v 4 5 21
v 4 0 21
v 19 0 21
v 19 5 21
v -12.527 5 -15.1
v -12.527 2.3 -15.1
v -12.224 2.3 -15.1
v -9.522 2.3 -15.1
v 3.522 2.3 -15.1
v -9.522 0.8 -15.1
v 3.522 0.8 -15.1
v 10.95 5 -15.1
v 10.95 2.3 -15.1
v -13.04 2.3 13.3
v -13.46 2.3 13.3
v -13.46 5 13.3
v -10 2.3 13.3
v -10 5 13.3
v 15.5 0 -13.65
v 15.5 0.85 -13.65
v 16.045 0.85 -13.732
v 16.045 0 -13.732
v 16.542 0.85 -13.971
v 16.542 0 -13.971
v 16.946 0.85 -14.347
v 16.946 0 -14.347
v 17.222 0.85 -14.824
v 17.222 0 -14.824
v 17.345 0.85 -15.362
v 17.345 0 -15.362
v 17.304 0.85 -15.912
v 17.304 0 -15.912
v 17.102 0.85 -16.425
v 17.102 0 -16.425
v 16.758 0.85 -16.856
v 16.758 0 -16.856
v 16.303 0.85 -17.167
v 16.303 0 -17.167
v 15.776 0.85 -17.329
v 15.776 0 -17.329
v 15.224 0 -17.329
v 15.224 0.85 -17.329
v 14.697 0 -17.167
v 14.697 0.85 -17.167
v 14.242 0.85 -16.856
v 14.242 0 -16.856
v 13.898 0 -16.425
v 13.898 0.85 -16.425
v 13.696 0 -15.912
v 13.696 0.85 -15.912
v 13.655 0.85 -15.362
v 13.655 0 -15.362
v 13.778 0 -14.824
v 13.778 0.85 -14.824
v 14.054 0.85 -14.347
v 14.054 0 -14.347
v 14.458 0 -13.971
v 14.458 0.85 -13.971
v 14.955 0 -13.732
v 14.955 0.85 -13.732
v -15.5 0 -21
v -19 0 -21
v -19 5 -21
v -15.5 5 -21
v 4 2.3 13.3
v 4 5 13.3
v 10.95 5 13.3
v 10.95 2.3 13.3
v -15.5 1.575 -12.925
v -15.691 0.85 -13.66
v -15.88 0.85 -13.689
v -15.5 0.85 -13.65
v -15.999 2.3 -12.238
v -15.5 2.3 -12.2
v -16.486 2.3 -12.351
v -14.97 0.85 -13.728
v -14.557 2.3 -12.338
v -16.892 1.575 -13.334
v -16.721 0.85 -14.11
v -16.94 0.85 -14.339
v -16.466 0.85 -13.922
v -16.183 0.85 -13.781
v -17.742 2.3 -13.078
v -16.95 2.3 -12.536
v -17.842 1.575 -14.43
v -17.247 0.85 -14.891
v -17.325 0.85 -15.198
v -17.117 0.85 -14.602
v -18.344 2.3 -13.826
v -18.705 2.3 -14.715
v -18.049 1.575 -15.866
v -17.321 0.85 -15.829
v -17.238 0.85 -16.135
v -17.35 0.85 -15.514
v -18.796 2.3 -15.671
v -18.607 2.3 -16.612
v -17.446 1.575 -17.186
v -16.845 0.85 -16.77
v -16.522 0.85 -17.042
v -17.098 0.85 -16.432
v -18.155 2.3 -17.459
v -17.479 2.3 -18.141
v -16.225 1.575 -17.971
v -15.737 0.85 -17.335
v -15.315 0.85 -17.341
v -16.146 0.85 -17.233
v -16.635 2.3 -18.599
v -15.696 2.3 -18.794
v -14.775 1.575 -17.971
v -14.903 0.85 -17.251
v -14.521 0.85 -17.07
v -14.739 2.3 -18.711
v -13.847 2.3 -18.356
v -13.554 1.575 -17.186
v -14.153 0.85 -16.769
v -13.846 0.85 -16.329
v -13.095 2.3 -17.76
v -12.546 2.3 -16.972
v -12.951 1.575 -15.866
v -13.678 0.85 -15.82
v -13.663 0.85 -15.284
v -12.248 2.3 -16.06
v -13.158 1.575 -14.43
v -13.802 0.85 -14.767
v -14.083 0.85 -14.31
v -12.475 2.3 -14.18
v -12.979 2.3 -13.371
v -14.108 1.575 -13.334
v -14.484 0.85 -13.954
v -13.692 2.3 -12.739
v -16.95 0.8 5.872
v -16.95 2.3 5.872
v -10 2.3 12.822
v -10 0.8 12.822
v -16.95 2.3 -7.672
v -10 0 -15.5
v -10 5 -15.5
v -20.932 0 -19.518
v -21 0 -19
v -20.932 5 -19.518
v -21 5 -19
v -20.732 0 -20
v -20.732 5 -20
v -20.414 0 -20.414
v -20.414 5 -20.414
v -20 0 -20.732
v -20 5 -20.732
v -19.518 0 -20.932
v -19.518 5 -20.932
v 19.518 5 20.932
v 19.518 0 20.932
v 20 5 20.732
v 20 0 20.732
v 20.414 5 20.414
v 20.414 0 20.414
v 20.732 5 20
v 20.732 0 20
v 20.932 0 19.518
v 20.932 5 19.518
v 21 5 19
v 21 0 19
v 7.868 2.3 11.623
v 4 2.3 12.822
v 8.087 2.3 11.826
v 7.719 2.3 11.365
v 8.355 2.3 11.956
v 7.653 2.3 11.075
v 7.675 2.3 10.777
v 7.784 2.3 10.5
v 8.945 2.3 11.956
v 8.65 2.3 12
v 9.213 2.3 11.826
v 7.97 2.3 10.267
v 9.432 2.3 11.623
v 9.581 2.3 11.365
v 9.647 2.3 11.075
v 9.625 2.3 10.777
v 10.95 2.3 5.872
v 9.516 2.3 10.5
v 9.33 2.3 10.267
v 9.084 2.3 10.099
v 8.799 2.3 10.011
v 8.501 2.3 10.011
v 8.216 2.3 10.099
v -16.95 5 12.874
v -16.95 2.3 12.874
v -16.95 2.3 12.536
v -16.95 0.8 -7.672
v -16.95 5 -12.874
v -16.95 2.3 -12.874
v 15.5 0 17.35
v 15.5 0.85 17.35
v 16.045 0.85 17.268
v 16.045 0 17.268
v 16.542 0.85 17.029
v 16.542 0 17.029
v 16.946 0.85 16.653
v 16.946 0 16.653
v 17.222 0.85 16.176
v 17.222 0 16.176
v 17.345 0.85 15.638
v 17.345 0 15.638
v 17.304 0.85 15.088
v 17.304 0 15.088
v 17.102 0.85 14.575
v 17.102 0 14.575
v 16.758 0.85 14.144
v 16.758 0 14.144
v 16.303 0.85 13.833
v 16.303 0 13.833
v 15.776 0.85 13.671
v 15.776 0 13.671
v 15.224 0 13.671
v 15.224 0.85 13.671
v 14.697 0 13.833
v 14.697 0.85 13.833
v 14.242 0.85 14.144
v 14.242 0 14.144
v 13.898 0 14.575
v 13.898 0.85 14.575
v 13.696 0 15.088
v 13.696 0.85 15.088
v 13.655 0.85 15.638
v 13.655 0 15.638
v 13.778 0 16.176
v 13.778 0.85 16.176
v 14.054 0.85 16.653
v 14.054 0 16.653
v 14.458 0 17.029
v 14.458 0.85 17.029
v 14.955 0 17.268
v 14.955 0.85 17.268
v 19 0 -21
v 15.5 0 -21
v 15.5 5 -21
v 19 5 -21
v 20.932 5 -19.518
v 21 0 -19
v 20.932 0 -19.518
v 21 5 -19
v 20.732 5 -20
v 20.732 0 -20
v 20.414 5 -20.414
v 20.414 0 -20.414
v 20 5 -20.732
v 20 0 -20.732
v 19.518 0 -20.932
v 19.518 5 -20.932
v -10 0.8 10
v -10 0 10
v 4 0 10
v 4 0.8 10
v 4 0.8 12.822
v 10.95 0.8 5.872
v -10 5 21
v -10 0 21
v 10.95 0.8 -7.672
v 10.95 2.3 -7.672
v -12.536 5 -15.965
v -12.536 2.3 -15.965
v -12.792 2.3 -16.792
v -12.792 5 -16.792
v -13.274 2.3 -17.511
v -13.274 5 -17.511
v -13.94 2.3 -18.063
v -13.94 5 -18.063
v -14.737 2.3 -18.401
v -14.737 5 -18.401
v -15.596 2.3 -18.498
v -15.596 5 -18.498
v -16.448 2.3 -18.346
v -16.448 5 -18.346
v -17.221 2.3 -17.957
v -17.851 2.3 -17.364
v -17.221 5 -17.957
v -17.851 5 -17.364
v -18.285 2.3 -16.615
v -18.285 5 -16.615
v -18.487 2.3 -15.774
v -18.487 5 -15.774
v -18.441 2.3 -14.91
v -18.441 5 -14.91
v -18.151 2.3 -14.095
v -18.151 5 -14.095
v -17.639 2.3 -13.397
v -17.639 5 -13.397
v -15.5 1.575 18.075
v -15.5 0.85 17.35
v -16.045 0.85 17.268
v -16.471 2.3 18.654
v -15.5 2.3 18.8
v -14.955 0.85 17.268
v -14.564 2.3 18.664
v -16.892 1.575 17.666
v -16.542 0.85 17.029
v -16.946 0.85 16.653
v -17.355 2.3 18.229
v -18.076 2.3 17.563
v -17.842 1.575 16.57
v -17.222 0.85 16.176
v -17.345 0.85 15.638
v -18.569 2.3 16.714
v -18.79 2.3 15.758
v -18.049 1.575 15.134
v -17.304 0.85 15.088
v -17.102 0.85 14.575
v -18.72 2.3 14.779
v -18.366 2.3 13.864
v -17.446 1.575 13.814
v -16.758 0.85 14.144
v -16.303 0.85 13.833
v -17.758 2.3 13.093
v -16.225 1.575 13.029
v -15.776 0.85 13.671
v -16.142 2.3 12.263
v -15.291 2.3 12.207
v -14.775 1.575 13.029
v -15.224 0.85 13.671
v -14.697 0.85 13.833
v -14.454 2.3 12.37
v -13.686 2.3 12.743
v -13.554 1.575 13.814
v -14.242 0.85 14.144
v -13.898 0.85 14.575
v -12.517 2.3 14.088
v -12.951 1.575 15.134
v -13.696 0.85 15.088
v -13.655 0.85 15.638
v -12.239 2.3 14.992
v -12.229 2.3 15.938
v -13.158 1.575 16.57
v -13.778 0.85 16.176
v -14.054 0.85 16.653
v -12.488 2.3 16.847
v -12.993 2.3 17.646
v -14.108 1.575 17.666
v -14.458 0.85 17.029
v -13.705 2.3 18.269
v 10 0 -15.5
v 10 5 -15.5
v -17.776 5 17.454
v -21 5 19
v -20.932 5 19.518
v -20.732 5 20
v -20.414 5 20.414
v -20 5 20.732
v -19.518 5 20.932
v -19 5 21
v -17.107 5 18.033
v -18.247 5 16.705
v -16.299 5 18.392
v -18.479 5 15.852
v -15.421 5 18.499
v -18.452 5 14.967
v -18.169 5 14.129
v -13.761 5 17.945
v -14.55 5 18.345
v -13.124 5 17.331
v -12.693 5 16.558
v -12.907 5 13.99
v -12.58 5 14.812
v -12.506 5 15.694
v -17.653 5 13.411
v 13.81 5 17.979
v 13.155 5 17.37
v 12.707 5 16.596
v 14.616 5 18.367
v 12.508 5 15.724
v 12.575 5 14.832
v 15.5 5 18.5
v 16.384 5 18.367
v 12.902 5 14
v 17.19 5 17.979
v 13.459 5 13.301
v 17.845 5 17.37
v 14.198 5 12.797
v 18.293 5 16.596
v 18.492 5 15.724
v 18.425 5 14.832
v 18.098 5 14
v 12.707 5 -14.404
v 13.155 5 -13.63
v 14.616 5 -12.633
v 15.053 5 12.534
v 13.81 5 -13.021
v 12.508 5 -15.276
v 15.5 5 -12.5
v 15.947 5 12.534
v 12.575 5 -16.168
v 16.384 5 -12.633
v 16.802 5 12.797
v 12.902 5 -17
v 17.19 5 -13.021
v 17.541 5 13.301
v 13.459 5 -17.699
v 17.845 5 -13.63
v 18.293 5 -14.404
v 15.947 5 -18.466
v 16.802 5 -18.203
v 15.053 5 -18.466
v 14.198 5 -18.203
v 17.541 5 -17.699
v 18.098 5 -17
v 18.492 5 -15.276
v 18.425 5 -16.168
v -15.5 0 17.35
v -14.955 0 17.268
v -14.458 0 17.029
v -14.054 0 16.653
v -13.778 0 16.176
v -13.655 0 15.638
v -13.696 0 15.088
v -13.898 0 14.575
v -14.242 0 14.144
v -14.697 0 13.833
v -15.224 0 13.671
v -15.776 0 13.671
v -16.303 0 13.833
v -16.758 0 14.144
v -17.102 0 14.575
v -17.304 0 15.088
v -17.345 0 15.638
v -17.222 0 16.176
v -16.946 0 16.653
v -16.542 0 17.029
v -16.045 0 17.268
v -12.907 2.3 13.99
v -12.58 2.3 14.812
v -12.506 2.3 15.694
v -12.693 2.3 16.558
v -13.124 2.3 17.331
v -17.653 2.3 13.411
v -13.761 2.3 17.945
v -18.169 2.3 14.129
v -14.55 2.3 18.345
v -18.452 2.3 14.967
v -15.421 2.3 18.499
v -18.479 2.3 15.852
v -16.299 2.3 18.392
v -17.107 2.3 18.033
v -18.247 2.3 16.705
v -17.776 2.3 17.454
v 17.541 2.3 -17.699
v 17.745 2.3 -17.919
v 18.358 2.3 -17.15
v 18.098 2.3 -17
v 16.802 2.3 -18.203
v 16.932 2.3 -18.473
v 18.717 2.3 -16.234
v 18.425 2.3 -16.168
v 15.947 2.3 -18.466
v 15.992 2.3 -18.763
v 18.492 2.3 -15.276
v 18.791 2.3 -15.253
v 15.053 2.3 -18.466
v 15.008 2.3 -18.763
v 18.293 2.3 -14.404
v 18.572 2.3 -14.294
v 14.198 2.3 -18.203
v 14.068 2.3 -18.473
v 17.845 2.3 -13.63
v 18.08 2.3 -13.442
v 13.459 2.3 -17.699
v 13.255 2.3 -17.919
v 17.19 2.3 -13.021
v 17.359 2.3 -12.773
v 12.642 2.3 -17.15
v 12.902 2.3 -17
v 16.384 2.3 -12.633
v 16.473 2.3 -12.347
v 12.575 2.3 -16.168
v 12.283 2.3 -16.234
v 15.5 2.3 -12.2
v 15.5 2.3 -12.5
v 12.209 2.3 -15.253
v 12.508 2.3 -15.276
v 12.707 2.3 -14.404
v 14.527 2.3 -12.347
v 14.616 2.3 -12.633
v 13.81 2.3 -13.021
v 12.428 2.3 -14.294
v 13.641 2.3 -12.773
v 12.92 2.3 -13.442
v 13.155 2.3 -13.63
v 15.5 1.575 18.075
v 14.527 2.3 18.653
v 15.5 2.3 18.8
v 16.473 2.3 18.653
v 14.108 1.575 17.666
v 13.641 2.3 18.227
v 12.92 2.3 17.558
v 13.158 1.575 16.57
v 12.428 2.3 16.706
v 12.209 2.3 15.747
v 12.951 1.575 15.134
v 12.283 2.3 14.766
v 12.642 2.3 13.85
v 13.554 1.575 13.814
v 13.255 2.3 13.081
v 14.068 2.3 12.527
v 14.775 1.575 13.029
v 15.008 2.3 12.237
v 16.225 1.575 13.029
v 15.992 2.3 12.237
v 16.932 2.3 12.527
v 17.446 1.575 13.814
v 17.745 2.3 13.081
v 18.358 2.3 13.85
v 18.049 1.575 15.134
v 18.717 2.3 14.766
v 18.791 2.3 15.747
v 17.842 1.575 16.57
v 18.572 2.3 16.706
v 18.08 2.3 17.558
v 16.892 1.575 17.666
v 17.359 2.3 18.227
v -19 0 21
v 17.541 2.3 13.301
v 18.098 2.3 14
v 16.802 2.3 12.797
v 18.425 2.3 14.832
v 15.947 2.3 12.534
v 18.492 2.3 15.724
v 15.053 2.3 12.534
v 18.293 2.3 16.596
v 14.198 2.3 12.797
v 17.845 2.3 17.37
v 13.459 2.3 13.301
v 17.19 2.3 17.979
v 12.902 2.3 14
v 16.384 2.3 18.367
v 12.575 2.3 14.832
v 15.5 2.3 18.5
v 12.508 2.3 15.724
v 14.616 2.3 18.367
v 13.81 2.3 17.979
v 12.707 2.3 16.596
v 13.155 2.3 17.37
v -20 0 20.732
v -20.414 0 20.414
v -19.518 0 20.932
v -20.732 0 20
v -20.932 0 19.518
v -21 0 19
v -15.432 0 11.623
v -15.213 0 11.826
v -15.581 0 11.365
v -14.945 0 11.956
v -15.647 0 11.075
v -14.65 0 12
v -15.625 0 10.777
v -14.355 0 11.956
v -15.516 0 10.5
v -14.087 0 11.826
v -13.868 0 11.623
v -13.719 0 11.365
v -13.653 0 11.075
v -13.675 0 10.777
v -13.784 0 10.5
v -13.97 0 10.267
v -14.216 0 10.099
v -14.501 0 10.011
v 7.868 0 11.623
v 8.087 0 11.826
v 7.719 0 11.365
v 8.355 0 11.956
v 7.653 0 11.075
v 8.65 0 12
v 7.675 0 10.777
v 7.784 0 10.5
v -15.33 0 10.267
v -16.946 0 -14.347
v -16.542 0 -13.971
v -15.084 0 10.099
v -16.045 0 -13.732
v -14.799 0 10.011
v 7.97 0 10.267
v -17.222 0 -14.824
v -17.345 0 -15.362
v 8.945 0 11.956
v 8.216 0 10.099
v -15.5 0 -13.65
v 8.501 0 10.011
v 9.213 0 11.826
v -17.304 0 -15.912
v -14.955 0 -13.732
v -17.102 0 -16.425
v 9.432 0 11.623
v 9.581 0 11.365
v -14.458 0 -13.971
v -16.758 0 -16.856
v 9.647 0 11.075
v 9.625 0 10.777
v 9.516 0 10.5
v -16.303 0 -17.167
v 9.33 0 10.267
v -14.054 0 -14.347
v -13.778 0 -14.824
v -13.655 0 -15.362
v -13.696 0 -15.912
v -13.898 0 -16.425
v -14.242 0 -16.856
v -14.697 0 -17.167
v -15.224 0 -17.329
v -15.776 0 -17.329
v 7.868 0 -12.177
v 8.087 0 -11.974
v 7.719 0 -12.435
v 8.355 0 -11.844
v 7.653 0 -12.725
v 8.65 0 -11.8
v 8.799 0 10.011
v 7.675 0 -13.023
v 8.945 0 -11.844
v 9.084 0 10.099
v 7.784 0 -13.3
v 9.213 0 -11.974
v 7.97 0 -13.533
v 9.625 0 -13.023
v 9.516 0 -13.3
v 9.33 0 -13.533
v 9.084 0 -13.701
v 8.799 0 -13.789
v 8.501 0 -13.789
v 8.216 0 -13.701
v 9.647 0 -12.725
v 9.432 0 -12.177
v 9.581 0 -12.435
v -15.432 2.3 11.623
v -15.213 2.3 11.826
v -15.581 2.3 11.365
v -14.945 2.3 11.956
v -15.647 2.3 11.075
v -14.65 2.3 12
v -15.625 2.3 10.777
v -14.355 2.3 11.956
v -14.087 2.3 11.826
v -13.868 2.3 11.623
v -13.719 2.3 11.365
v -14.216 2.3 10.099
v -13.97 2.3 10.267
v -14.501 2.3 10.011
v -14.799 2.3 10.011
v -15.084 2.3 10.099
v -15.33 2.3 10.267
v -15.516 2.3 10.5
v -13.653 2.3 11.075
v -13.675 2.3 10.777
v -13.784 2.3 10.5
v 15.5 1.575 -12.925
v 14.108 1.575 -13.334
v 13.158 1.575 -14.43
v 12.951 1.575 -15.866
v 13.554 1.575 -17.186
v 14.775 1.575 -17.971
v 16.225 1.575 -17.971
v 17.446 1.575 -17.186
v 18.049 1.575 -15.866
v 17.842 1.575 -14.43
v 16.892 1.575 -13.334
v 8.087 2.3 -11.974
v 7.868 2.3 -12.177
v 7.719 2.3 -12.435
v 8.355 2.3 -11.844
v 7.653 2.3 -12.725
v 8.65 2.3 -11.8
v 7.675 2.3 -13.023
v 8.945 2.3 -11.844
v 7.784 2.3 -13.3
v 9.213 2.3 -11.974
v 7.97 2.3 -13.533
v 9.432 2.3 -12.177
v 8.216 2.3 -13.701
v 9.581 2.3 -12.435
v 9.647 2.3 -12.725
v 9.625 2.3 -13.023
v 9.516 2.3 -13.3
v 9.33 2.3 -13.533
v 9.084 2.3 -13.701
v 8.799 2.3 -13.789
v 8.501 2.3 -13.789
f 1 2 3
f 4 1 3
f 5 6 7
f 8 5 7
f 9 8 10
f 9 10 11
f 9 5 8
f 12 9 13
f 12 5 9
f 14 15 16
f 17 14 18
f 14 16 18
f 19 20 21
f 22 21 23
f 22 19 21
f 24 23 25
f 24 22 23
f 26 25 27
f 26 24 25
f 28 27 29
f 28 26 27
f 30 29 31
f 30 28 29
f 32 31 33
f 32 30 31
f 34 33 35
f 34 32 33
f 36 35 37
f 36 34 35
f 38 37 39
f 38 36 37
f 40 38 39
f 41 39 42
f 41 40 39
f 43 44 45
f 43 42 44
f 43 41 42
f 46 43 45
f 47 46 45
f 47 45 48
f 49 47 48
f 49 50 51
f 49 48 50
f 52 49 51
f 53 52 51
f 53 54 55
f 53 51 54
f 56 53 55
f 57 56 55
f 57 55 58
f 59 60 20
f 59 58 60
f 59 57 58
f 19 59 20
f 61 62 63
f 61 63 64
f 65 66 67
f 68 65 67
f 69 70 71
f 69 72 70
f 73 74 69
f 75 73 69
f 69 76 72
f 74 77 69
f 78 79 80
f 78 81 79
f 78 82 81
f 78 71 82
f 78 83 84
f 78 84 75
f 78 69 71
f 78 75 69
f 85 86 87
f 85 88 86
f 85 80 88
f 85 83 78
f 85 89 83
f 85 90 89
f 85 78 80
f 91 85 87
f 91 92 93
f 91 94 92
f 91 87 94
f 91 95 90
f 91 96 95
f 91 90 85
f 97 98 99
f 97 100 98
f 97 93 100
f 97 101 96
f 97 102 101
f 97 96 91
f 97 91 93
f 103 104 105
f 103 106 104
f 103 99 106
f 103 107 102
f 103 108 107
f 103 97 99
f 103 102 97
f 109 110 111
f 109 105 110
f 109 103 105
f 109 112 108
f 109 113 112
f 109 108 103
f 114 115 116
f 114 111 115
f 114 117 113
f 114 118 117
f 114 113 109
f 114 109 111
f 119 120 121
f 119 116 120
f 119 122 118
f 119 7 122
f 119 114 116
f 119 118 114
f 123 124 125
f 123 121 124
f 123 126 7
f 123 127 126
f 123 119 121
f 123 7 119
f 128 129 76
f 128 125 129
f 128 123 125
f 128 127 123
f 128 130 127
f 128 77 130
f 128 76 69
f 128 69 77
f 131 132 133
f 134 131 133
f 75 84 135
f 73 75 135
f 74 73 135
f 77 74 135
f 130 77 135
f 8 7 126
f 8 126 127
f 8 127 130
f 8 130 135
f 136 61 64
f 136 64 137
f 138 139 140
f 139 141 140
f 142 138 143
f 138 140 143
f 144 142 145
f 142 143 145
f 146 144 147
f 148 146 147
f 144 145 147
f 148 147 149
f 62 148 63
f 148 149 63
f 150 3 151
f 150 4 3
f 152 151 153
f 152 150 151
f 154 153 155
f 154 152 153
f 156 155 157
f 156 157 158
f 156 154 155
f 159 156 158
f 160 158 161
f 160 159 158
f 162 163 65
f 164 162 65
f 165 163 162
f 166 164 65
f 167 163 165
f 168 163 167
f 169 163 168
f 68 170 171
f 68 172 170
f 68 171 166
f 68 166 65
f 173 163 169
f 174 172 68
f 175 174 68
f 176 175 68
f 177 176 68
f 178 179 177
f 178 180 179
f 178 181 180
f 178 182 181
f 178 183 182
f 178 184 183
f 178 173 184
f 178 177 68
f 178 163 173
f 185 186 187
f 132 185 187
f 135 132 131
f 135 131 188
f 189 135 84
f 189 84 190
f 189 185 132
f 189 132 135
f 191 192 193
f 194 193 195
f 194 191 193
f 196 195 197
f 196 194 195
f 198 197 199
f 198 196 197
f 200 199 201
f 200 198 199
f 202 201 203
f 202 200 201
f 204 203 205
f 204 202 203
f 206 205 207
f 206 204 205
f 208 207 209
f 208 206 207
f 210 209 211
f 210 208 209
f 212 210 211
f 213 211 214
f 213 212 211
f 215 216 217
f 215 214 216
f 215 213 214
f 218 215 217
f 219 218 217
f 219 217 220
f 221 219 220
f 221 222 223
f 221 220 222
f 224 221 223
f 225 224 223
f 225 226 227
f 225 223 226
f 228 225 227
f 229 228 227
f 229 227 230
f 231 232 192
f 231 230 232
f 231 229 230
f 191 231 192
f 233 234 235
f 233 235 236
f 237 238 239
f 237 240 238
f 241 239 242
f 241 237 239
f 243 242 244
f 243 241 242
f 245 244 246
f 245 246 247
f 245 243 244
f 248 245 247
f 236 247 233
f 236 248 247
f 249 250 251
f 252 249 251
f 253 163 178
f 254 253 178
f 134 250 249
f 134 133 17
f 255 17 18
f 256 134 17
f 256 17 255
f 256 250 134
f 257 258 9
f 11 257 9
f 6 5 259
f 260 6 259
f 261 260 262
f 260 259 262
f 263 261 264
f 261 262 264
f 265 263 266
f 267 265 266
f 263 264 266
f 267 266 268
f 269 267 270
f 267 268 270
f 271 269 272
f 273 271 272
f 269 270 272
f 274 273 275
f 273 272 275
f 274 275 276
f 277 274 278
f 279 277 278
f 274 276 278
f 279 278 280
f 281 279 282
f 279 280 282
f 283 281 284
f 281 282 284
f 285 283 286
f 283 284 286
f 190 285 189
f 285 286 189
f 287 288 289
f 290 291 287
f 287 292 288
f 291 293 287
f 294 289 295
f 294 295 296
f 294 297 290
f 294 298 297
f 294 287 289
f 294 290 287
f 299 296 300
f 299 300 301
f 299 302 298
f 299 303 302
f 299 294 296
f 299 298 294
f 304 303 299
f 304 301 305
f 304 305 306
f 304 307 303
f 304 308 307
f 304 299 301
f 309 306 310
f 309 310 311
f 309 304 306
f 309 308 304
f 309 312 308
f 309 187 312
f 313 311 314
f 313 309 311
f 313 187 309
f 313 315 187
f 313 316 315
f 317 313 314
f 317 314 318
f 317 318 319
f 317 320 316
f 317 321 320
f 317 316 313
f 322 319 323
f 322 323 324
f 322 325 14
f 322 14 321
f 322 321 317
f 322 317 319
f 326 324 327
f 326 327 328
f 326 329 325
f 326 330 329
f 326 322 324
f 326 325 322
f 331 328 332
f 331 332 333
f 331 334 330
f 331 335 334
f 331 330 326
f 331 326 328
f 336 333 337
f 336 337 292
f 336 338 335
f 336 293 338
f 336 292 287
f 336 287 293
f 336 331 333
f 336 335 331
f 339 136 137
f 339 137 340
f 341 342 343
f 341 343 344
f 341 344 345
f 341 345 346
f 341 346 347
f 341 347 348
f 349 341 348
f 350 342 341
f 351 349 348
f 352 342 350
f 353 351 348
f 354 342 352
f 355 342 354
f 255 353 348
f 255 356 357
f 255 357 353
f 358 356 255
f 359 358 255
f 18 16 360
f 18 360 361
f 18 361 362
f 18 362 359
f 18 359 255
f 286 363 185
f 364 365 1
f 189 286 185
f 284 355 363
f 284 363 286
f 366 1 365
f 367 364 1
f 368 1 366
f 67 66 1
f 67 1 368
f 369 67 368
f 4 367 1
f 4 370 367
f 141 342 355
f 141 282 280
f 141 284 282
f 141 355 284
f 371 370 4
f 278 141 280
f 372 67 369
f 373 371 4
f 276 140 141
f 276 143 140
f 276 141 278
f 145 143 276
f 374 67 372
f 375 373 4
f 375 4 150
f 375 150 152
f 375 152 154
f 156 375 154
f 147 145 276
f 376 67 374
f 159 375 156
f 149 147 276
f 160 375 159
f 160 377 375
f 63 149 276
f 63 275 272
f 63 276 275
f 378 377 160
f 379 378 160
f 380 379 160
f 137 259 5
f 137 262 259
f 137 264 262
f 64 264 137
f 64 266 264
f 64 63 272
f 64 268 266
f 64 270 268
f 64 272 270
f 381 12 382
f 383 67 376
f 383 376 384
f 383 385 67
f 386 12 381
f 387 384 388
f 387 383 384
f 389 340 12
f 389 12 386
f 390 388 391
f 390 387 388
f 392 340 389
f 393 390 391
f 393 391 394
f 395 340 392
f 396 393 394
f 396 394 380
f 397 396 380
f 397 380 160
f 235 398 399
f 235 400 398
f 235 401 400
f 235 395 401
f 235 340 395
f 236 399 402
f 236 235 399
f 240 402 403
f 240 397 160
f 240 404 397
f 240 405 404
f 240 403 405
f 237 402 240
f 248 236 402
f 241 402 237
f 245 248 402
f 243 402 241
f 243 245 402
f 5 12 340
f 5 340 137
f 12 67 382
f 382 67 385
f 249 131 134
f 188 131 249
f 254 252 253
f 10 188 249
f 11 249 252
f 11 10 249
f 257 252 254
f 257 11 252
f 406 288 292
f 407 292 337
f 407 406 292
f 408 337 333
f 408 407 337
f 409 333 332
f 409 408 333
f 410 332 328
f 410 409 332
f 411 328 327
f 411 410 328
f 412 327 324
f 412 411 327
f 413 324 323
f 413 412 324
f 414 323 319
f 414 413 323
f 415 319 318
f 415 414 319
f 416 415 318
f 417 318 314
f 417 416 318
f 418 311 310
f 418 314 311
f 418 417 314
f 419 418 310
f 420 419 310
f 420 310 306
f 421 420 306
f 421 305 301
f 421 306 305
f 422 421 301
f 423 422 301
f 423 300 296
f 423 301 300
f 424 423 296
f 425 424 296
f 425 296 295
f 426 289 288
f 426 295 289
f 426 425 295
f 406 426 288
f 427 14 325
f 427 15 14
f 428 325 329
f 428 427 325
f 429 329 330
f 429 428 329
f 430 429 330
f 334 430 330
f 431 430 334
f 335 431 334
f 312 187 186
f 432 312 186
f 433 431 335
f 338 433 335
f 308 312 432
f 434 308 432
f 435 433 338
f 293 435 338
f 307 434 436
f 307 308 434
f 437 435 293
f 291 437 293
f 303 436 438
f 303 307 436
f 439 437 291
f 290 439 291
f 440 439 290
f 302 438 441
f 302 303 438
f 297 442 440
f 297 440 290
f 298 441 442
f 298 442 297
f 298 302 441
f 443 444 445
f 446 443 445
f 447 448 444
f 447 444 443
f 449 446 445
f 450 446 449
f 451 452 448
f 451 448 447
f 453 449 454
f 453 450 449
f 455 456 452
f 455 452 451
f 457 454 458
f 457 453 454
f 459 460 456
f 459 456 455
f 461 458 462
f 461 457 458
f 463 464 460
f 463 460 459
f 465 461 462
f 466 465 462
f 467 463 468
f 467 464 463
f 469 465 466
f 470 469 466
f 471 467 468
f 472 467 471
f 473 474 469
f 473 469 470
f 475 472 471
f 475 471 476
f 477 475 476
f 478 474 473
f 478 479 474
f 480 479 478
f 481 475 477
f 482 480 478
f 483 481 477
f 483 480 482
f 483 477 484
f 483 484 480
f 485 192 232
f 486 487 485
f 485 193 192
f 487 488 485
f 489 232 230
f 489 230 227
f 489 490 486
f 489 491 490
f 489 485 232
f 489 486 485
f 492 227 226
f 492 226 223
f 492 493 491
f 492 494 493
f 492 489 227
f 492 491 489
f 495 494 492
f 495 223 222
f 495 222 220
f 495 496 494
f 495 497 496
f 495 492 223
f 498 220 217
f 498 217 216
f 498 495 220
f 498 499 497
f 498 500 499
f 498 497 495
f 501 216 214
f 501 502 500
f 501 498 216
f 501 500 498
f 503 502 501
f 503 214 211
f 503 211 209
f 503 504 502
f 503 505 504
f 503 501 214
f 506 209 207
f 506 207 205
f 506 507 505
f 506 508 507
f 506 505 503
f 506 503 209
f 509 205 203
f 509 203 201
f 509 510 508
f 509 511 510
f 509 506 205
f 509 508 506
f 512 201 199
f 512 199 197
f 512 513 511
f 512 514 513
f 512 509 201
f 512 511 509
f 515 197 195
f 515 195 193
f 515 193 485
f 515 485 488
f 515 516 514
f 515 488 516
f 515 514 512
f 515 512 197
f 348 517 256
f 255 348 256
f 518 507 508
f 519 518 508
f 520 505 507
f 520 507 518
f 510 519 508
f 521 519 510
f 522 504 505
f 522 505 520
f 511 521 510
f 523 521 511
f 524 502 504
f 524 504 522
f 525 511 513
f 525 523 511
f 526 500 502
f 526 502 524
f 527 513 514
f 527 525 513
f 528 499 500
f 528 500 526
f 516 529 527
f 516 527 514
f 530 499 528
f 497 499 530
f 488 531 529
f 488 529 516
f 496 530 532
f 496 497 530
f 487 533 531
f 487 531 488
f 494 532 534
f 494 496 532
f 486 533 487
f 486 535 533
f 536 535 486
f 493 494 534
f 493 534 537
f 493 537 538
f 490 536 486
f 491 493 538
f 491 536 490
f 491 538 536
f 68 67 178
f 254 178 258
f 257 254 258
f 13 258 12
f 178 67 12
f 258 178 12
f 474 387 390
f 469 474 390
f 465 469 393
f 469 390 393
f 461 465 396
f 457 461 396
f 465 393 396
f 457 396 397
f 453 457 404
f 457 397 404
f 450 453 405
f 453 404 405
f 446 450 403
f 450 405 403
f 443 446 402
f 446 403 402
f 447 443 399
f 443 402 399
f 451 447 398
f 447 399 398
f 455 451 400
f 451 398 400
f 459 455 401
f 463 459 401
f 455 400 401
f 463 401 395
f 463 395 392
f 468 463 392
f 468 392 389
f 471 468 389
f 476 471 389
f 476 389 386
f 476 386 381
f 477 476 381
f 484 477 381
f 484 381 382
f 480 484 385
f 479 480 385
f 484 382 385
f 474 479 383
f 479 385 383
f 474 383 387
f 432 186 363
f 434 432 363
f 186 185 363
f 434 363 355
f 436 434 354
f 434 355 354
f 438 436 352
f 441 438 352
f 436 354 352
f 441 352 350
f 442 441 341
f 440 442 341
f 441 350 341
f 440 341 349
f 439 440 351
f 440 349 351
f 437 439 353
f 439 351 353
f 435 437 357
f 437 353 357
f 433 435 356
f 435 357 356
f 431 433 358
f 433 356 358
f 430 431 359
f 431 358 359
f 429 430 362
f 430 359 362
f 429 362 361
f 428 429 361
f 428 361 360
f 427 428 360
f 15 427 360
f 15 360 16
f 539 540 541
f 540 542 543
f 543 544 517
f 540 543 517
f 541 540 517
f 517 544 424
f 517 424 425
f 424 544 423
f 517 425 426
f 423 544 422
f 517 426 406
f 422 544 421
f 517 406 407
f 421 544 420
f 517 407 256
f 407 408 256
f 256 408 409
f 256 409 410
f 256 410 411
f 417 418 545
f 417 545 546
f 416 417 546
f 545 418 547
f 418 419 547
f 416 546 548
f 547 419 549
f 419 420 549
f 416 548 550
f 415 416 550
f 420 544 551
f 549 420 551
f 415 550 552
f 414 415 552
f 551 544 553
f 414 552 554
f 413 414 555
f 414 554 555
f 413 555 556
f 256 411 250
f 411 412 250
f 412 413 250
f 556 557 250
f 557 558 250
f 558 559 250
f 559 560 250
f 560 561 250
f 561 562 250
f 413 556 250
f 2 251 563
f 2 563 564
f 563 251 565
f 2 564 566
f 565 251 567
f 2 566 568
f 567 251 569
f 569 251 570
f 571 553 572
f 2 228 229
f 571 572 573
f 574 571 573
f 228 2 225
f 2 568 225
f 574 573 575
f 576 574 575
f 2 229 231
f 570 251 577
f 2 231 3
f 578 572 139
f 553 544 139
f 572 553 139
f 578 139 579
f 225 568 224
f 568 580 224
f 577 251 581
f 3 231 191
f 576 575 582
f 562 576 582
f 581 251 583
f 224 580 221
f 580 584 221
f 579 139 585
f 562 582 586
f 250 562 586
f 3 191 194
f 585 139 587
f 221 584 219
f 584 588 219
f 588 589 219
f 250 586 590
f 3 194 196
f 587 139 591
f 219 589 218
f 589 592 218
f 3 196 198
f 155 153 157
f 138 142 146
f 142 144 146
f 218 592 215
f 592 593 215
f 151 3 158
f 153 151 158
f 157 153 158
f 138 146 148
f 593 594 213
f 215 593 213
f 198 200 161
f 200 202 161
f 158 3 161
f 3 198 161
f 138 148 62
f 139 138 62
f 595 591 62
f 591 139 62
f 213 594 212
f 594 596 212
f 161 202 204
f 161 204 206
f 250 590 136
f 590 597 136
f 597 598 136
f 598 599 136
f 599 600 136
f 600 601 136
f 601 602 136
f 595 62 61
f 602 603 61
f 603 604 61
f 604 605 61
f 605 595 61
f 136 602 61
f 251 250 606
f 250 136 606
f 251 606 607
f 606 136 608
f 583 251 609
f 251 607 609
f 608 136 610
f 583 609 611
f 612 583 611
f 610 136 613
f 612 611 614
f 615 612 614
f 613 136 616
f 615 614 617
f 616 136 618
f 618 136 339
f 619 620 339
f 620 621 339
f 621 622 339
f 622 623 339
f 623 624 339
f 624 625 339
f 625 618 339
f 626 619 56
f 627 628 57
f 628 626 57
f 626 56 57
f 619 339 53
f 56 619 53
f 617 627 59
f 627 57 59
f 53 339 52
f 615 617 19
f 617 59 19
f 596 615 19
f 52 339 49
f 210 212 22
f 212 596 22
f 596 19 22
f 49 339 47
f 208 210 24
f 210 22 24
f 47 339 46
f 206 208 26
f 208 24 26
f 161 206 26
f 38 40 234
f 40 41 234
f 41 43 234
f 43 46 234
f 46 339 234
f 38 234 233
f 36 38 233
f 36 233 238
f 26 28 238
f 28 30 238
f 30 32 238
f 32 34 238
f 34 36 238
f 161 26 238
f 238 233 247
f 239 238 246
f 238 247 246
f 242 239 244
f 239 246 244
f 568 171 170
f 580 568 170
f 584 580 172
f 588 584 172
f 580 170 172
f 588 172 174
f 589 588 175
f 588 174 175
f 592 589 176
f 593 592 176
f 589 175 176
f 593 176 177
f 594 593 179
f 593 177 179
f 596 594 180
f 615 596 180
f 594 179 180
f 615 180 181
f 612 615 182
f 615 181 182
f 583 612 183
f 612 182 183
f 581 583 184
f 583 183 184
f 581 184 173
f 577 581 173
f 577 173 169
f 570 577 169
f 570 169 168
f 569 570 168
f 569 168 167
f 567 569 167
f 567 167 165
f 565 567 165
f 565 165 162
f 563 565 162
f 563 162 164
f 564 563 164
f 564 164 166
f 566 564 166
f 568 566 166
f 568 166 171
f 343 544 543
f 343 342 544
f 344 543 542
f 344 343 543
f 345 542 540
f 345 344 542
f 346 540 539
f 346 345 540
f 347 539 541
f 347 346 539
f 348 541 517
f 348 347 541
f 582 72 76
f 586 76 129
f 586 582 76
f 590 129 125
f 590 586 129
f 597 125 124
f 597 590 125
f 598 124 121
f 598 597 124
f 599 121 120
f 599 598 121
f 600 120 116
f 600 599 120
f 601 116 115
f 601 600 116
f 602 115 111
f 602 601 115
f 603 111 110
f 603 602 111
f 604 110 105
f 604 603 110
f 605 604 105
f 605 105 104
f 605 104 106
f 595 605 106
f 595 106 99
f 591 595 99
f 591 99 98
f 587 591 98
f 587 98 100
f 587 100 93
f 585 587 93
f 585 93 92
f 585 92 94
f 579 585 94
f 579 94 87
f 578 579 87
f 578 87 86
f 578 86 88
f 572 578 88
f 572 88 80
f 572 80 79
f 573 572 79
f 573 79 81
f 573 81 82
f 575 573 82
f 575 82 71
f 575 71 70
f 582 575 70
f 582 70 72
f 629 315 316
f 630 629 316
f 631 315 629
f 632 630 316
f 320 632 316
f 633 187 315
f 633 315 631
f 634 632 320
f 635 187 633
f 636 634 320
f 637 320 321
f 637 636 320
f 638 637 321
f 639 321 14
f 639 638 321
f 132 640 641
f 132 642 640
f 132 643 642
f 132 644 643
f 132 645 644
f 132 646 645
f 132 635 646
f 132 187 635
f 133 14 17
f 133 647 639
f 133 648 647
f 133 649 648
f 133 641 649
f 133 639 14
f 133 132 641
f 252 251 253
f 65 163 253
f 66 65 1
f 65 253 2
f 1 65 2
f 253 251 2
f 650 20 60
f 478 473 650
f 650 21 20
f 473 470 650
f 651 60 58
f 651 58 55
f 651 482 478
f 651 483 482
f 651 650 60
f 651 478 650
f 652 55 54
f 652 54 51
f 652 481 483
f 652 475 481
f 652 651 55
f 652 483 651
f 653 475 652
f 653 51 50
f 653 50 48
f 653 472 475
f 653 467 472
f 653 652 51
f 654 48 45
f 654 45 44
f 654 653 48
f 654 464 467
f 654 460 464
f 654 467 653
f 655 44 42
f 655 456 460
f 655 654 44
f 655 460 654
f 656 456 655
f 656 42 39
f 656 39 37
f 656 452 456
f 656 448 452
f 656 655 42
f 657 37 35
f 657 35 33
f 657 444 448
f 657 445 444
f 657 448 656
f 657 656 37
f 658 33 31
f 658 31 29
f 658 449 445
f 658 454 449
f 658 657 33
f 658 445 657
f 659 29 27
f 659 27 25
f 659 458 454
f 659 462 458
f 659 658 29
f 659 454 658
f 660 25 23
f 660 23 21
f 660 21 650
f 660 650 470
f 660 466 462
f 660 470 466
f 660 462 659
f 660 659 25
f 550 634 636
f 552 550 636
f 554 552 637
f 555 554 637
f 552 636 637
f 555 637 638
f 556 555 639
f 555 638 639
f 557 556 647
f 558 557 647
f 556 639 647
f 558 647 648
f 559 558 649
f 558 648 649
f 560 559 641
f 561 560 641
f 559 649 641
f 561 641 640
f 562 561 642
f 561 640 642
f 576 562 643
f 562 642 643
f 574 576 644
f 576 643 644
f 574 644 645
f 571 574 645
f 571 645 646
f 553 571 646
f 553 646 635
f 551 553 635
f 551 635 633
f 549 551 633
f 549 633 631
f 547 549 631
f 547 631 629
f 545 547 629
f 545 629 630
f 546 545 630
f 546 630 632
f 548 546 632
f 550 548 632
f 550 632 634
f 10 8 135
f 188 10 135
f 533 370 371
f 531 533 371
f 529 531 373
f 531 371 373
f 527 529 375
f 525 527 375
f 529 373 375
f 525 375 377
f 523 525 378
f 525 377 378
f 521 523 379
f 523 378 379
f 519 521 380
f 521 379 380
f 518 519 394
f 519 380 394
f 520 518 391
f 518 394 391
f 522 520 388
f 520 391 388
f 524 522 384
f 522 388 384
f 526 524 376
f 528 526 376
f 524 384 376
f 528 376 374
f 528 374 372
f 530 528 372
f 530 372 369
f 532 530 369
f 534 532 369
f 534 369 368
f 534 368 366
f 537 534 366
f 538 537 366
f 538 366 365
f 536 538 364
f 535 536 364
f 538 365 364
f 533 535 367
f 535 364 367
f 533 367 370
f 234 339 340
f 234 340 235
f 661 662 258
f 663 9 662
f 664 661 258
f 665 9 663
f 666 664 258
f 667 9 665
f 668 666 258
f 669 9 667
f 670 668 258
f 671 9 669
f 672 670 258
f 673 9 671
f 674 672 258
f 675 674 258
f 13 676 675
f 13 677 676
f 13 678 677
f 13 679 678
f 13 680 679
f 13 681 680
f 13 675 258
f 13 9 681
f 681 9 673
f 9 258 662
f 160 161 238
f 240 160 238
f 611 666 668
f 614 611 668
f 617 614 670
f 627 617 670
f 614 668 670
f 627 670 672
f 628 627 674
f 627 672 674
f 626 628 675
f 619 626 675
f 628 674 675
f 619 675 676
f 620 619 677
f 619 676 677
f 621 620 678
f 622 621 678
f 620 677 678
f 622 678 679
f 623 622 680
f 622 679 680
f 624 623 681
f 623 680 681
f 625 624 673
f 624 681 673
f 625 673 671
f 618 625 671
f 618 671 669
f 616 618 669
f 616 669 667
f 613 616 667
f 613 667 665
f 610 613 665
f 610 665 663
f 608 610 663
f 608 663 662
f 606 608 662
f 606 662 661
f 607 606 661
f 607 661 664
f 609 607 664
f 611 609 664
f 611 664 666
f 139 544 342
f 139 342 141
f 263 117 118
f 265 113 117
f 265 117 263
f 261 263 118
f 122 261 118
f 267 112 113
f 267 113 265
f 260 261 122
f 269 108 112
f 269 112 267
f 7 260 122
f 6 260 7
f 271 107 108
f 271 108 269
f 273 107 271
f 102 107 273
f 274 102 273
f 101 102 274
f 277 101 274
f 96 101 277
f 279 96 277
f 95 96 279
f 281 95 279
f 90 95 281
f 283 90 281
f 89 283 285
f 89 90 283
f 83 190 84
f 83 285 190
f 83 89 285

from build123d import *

# Parameters (mm, degrees)
SKETCH_1_W               = 42
SKETCH_1_H               = 42
SKETCH_1_R               = 1.85
EXTRUDE_1_DEPTH          = 5
FILLET_2_R               = 2
FILLET_3_R               = 2
FILLET_4_R               = 2
FILLET_5_R               = 2
CUT_EXTRUDE_3_DEPTH      = 31.116440693
SKETCH_6_W               = 14
SKETCH_6_H               = 11
CUT_EXTRUDE_4_DEPTH      = 31.116440693
SKETCH_8_R               = 1
CUT_EXTRUDE_6_DEPTH      = 31.116440693
SKETCH_9_R               = 3
CUT_EXTRUDE_7_DEPTH      = 2.7
SKETCH_11_W              = 27.9
SKETCH_11_H              = 28.4
CUT_EXTRUDE_14_DEPTH     = 2.7
CUT_EXTRUDE_15_DEPTH     = 1.5
HOLE_WIZARD_1_AT_2_COUNT = 2
HOLE_WIZARD_1_AT_2_PITCH = 31
HOLE_WIZARD_1_AT_3_COUNT = 2
HOLE_WIZARD_1_AT_3_PITCH = 43.840620434
HOLE_WIZARD_1_AT_4_COUNT = 2
HOLE_WIZARD_1_AT_4_PITCH = 31


with BuildPart() as part:
    # 草图1 → 凸台-拉伸1 (new body)
    with BuildSketch(Plane(origin=(0, 0, 0), x_dir=(1, 0, 0), z_dir=(0, 1, 0))):
        Rectangle(SKETCH_1_W, SKETCH_1_H)
        with Locations(Location((15.5, 15.5, 0), (0, 0, 270))):
            Circle(SKETCH_1_R, mode=Mode.SUBTRACT)
        with Locations(Location((-15.5, 15.5, 0), (0, 0, 270))):
            Circle(SKETCH_1_R, mode=Mode.SUBTRACT)
        with Locations(Location((-15.5, -15.5, 0), (0, 0, 270))):
            Circle(SKETCH_1_R, mode=Mode.SUBTRACT)
        with Locations(Location((15.5, -15.5, 0), (0, 0, 270))):
            Circle(SKETCH_1_R, mode=Mode.SUBTRACT)
    extrude(amount=EXTRUDE_1_DEPTH)

    # 圆角2
    fillet_2_edges = [part.edges().sort_by_distance(p)[0] for p in [
        (-21, 2.5, -21),
    ]]
    fillet(fillet_2_edges, radius=FILLET_2_R)

    # 圆角3
    fillet_3_edges = [part.edges().sort_by_distance(p)[0] for p in [
        (-21, 2.5, 21),
    ]]
    fillet(fillet_3_edges, radius=FILLET_3_R)

    # 圆角4
    fillet_4_edges = [part.edges().sort_by_distance(p)[0] for p in [
        (21, 2.5, 21),
    ]]
    fillet(fillet_4_edges, radius=FILLET_4_R)

    # 圆角5
    fillet_5_edges = [part.edges().sort_by_distance(p)[0] for p in [
        (21, 2.5, -21),
    ]]
    fillet(fillet_5_edges, radius=FILLET_5_R)

    # 草图5 → 切除-拉伸3 (cut, through all)
    with BuildSketch(Plane.XZ):
        Polygon((-15.5, -21), (-10, -15.5), (10, -15.5), (15.5, -21), align=None)
    extrude(amount=-CUT_EXTRUDE_3_DEPTH, mode=Mode.SUBTRACT)

    # 草图6 → 切除-拉伸4 (cut, through all)
    with BuildSketch(Plane.XZ):
        with Locations((-3, 15.5)):
            Rectangle(SKETCH_6_W, SKETCH_6_H)
    extrude(amount=-CUT_EXTRUDE_4_DEPTH, mode=Mode.SUBTRACT)

    # 草图8 → 切除-拉伸6 (cut, through all)
    with BuildSketch(Plane(origin=(0, 5, 0), x_dir=(1, 0, 0), z_dir=(0, 1, 0))):
        with Locations(Location((-14.65, -11, 0), (0, 0, 270))):
            Circle(SKETCH_8_R)
        with Locations(Location((8.65, -11, 0), (0, 0, 270))):
            Circle(SKETCH_8_R)
        with Locations(Location((8.65, 12.8, 0), (0, 0, 270))):
            Circle(SKETCH_8_R)
    extrude(amount=-CUT_EXTRUDE_6_DEPTH, mode=Mode.SUBTRACT)

    # 草图9 → 切除-拉伸7 (cut)
    with BuildSketch(Plane(origin=(0, 5, 0), x_dir=(1, 0, 0), z_dir=(0, 1, 0))):
        with Locations(Location((-15.5, 15.5, 0), (0, 0, 270))):
            Circle(SKETCH_9_R)
        with Locations(Location((15.5, 15.5, 0), (0, 0, 270))):
            Circle(SKETCH_9_R)
        with Locations(Location((15.5, -15.5, 0), (0, 0, 270))):
            Circle(SKETCH_9_R)
        with Locations(Location((-15.5, -15.5, 0), (0, 0, 270))):
            Circle(SKETCH_9_R)
    extrude(amount=-CUT_EXTRUDE_7_DEPTH, mode=Mode.SUBTRACT)

    # 草图11 → 切除-拉伸14 (cut)
    with BuildSketch(Plane(origin=(0, 5, 0), x_dir=(1, 0, 0), z_dir=(0, 1, 0))):
        with Locations((-3, 0.9)):
            Rectangle(SKETCH_11_W, SKETCH_11_H)
    extrude(amount=-CUT_EXTRUDE_14_DEPTH, mode=Mode.SUBTRACT)

    # 草图12 → 切除-拉伸15 (cut)
    with BuildSketch(Plane(origin=(0, 2.3, 0), x_dir=(1, 0, 0), z_dir=(0, 1, 0))):
        Polygon((10.95, -5.871572875), (10.95, 7.671572875), (3.521572875, 15.1), (-9.521572875, 15.1), (-16.95, 7.671572875), (-16.95, -5.871572875), (-9.521572875, -13.3), (3.521572875, -13.3), align=None)
    extrude(amount=-CUT_EXTRUDE_15_DEPTH, mode=Mode.SUBTRACT)

    # 草图14 → 打孔尺寸(%根据十字)槽半沉头木螺钉的类型1 (revolve, cut)
    with BuildSketch(Plane(origin=(15.5, 2.3, 15.5), x_dir=(0, 0, 1), z_dir=(1, 0, 0))):
        Polygon((0, 0), (0, 2.3), (1.8, 2.3), (1.8, 1.5), (3.3, 0), align=None)
    hole_wizard_1 = revolve(axis=Axis((15.5, 8.65, 15.5), (0, -1, 0)), mode=Mode.SUBTRACT)

    # 打孔尺寸(%根据十字)槽半沉头木螺钉的类型1 at 2: 打孔尺寸(%根据十字)槽半沉头木螺钉的类型1 ×2
    with Locations(*[(-i * HOLE_WIZARD_1_AT_2_PITCH, 0, 0) for i in range(1, HOLE_WIZARD_1_AT_2_COUNT)]):
        add(hole_wizard_1, mode=Mode.SUBTRACT)

    # 打孔尺寸(%根据十字)槽半沉头木螺钉的类型1 at 3: 打孔尺寸(%根据十字)槽半沉头木螺钉的类型1 ×2
    with Locations(*[Vector(-0.7071067811865476, 0, -0.7071067811865476) * (i * HOLE_WIZARD_1_AT_3_PITCH) for i in range(1, HOLE_WIZARD_1_AT_3_COUNT)]):
        add(hole_wizard_1, mode=Mode.SUBTRACT)

    # 打孔尺寸(%根据十字)槽半沉头木螺钉的类型1 at 4: 打孔尺寸(%根据十字)槽半沉头木螺钉的类型1 ×2
    with Locations(*[(0, 0, -i * HOLE_WIZARD_1_AT_4_PITCH) for i in range(1, HOLE_WIZARD_1_AT_4_COUNT)]):
        add(hole_wizard_1, mode=Mode.SUBTRACT)


solid = part.part
